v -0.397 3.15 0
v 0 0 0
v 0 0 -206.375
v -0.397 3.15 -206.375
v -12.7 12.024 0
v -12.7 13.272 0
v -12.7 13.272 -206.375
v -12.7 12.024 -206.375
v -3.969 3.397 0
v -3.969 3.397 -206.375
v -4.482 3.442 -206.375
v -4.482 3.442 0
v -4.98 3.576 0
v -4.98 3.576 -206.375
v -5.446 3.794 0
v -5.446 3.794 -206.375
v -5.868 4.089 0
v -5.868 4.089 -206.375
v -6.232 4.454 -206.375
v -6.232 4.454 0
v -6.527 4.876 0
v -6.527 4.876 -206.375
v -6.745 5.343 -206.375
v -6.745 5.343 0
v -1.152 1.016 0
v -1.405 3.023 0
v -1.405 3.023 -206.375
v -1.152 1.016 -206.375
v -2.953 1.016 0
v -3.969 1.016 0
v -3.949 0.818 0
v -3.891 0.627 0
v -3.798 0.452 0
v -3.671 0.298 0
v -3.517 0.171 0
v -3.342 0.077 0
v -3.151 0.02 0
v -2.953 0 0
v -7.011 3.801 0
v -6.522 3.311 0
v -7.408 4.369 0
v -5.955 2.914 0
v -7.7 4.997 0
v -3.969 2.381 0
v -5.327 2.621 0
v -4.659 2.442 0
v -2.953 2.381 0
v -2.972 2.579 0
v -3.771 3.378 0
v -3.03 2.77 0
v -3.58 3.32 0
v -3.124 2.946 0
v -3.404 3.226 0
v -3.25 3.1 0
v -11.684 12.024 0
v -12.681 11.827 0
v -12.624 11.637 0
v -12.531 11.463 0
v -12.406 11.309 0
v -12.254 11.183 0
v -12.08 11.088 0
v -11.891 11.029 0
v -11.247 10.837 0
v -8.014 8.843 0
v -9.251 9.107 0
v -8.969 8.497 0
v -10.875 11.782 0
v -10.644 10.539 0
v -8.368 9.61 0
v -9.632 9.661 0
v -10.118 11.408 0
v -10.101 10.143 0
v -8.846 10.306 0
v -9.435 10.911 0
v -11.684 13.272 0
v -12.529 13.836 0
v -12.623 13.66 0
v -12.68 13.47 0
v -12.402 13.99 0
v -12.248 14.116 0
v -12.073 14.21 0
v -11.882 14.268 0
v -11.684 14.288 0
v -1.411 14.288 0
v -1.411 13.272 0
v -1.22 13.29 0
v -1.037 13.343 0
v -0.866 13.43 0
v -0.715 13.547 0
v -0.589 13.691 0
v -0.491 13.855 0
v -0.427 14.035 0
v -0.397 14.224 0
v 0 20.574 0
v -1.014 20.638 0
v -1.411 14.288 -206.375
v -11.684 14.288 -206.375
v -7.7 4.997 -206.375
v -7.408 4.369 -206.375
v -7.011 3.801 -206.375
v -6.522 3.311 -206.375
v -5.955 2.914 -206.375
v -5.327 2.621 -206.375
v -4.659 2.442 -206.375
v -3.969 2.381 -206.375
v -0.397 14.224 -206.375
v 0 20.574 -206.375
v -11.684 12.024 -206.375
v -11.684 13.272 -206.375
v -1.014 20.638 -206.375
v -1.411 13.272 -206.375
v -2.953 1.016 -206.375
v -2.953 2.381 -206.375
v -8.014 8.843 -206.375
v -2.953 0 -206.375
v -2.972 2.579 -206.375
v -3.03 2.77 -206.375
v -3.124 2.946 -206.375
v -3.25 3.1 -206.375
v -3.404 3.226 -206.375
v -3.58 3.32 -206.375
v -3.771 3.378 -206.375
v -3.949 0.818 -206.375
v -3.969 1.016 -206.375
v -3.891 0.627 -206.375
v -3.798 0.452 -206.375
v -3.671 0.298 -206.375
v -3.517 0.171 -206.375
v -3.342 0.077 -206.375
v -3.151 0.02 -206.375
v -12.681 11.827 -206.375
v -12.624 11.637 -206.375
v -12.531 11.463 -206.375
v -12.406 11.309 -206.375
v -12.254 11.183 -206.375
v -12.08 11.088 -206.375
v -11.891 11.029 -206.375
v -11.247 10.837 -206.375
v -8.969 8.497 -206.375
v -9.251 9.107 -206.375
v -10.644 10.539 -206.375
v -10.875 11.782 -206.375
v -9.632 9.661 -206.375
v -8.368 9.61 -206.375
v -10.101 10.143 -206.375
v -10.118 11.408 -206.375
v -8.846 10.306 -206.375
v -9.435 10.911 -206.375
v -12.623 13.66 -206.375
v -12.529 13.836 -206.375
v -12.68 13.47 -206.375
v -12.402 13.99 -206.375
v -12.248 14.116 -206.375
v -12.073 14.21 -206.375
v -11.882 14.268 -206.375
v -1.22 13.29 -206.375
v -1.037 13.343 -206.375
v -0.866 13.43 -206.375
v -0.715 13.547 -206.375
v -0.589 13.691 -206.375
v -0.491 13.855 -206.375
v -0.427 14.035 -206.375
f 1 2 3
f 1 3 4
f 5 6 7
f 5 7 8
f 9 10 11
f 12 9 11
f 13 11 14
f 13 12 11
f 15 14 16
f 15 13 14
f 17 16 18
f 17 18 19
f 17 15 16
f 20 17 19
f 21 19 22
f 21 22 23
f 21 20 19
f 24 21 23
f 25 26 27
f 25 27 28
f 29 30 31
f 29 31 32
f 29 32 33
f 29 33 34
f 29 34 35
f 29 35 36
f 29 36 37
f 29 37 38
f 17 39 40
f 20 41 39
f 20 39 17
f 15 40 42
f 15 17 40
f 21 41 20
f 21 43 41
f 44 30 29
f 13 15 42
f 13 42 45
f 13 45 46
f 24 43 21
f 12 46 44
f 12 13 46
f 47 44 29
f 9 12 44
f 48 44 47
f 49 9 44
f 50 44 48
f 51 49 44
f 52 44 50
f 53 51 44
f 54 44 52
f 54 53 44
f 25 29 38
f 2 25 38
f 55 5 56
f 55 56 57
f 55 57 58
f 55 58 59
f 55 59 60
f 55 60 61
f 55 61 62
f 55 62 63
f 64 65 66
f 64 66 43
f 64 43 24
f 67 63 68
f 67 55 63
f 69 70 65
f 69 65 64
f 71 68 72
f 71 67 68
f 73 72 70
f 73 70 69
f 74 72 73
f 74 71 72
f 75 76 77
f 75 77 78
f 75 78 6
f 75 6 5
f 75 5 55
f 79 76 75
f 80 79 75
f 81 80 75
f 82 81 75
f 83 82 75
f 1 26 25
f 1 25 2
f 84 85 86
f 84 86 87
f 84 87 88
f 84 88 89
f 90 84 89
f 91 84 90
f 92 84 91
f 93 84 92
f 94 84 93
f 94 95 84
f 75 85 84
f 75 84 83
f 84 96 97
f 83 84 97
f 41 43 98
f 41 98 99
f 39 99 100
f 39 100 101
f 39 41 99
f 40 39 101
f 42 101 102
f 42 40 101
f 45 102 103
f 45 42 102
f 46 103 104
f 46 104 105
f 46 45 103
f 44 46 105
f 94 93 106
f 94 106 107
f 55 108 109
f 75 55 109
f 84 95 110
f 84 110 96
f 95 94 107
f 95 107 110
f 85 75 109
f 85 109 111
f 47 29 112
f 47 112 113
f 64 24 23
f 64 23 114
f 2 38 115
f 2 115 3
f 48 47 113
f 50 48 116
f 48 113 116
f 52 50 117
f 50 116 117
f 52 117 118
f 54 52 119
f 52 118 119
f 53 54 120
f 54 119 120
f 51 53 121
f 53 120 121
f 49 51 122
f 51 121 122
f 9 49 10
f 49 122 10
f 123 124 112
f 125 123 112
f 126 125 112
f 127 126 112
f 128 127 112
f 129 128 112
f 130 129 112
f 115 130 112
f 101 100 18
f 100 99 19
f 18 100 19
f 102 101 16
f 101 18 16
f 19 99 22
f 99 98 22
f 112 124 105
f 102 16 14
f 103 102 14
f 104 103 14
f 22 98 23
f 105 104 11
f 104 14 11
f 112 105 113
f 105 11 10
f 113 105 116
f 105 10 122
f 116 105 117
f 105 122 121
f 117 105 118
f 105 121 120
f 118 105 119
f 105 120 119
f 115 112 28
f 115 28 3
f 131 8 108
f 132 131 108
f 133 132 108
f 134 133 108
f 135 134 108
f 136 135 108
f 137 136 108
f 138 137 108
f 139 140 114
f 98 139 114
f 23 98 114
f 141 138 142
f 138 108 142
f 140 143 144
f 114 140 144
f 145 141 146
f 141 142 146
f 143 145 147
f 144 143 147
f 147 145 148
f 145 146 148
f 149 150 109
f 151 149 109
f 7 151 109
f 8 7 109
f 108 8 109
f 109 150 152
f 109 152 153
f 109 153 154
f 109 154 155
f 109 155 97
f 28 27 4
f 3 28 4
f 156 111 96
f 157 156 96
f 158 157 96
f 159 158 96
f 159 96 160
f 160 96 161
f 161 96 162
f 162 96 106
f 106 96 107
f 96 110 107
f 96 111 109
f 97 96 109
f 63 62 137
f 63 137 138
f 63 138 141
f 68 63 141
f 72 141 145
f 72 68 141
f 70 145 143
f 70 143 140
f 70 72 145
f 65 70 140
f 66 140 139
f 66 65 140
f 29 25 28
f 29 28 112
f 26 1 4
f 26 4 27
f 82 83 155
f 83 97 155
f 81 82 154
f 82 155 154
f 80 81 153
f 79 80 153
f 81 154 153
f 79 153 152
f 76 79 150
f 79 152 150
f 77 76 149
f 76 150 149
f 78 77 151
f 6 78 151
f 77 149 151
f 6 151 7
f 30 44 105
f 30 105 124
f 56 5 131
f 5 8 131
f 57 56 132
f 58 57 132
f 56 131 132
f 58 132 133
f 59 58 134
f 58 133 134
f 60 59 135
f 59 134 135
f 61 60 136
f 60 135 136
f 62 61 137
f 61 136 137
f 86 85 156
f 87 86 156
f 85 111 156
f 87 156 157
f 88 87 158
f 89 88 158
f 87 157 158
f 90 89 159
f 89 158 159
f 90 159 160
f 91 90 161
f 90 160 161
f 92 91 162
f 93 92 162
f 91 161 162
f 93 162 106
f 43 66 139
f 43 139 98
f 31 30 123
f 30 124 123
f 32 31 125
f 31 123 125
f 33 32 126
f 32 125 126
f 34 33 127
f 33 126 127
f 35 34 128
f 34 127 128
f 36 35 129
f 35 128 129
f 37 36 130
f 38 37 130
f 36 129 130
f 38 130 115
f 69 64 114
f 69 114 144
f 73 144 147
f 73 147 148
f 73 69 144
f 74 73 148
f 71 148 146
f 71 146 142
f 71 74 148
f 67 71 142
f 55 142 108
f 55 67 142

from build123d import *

# Parameters (mm, degrees)
EXTRUDE_THIN1_DEPTH = 206.375
FILLET1_R           = 1.016


with BuildPart() as part:
    # Sketch1 → Extrude-Thin1 (new body)
    with BuildSketch(Plane.XY):
        with BuildLine():
            Line((-1.01402142, 20.6375), (-1.41089642, 14.2875))
            Line((-1.41089642, 14.2875), (-12.7, 14.2875))
            Line((-12.7, 14.2875), (-12.7, 11.1125))
            ThreePointArc((-12.7, 11.1125), (-10.421749313, 10.393450043), (-8.969036168, 8.496852156))
            Line((-8.969036168, 8.496852156), (-7.699713832, 4.996897844))
            ThreePointArc((-7.699713832, 4.996897844), (-6.247000687, 3.100299957), (-3.96875, 2.38125))
            Line((-3.96875, 2.38125), (-3.96875, 0))
            Line((-3.96875, 0), (0, 0))
            Line((0, 0), (-0.396875, 3.150097655))
            Line((-0.396875, 3.150097655), (-1.40490625, 3.023097655))
            Line((-1.40490625, 3.023097655), (-1.152035714, 1.016))
            Line((-1.152035714, 1.016), (-2.95275, 1.016))
            Line((-2.95275, 1.016), (-2.95275, 3.57755044))
            ThreePointArc((-2.95275, 3.57755044), (-5.215232033, 3.673245416), (-6.744587091, 5.343291996))
            Line((-6.744587091, 5.343291996), (-8.013909427, 8.843246308))
            ThreePointArc((-8.013909427, 8.843246308), (-9.435411883, 10.910737787), (-11.684, 12.023860302))
            Line((-11.684, 12.023860302), (-11.684, 13.2715))
            Line((-11.684, 13.2715), (-0.456413979, 13.2715))
            Line((-0.456413979, 13.2715), (0, 20.574123661))
            Line((0, 20.574123661), (-1.01402142, 20.6375))
        make_face()
    extrude(amount=-EXTRUDE_THIN1_DEPTH)

    # Fillet1
    fillet1_edges = [part.edges().sort_by_distance(p)[0] for p in [
        (-3.96875, 0, -103.1875),
        (-12.7, 11.1125, -103.1875),
        (-12.7, 14.2875, -103.1875),
        (-0.456413979, 13.2715, -103.1875),
        (-2.95275, 3.57755044, -103.1875),
    ]]
    fillet(fillet1_edges, radius=FILLET1_R)


solid = part.part
